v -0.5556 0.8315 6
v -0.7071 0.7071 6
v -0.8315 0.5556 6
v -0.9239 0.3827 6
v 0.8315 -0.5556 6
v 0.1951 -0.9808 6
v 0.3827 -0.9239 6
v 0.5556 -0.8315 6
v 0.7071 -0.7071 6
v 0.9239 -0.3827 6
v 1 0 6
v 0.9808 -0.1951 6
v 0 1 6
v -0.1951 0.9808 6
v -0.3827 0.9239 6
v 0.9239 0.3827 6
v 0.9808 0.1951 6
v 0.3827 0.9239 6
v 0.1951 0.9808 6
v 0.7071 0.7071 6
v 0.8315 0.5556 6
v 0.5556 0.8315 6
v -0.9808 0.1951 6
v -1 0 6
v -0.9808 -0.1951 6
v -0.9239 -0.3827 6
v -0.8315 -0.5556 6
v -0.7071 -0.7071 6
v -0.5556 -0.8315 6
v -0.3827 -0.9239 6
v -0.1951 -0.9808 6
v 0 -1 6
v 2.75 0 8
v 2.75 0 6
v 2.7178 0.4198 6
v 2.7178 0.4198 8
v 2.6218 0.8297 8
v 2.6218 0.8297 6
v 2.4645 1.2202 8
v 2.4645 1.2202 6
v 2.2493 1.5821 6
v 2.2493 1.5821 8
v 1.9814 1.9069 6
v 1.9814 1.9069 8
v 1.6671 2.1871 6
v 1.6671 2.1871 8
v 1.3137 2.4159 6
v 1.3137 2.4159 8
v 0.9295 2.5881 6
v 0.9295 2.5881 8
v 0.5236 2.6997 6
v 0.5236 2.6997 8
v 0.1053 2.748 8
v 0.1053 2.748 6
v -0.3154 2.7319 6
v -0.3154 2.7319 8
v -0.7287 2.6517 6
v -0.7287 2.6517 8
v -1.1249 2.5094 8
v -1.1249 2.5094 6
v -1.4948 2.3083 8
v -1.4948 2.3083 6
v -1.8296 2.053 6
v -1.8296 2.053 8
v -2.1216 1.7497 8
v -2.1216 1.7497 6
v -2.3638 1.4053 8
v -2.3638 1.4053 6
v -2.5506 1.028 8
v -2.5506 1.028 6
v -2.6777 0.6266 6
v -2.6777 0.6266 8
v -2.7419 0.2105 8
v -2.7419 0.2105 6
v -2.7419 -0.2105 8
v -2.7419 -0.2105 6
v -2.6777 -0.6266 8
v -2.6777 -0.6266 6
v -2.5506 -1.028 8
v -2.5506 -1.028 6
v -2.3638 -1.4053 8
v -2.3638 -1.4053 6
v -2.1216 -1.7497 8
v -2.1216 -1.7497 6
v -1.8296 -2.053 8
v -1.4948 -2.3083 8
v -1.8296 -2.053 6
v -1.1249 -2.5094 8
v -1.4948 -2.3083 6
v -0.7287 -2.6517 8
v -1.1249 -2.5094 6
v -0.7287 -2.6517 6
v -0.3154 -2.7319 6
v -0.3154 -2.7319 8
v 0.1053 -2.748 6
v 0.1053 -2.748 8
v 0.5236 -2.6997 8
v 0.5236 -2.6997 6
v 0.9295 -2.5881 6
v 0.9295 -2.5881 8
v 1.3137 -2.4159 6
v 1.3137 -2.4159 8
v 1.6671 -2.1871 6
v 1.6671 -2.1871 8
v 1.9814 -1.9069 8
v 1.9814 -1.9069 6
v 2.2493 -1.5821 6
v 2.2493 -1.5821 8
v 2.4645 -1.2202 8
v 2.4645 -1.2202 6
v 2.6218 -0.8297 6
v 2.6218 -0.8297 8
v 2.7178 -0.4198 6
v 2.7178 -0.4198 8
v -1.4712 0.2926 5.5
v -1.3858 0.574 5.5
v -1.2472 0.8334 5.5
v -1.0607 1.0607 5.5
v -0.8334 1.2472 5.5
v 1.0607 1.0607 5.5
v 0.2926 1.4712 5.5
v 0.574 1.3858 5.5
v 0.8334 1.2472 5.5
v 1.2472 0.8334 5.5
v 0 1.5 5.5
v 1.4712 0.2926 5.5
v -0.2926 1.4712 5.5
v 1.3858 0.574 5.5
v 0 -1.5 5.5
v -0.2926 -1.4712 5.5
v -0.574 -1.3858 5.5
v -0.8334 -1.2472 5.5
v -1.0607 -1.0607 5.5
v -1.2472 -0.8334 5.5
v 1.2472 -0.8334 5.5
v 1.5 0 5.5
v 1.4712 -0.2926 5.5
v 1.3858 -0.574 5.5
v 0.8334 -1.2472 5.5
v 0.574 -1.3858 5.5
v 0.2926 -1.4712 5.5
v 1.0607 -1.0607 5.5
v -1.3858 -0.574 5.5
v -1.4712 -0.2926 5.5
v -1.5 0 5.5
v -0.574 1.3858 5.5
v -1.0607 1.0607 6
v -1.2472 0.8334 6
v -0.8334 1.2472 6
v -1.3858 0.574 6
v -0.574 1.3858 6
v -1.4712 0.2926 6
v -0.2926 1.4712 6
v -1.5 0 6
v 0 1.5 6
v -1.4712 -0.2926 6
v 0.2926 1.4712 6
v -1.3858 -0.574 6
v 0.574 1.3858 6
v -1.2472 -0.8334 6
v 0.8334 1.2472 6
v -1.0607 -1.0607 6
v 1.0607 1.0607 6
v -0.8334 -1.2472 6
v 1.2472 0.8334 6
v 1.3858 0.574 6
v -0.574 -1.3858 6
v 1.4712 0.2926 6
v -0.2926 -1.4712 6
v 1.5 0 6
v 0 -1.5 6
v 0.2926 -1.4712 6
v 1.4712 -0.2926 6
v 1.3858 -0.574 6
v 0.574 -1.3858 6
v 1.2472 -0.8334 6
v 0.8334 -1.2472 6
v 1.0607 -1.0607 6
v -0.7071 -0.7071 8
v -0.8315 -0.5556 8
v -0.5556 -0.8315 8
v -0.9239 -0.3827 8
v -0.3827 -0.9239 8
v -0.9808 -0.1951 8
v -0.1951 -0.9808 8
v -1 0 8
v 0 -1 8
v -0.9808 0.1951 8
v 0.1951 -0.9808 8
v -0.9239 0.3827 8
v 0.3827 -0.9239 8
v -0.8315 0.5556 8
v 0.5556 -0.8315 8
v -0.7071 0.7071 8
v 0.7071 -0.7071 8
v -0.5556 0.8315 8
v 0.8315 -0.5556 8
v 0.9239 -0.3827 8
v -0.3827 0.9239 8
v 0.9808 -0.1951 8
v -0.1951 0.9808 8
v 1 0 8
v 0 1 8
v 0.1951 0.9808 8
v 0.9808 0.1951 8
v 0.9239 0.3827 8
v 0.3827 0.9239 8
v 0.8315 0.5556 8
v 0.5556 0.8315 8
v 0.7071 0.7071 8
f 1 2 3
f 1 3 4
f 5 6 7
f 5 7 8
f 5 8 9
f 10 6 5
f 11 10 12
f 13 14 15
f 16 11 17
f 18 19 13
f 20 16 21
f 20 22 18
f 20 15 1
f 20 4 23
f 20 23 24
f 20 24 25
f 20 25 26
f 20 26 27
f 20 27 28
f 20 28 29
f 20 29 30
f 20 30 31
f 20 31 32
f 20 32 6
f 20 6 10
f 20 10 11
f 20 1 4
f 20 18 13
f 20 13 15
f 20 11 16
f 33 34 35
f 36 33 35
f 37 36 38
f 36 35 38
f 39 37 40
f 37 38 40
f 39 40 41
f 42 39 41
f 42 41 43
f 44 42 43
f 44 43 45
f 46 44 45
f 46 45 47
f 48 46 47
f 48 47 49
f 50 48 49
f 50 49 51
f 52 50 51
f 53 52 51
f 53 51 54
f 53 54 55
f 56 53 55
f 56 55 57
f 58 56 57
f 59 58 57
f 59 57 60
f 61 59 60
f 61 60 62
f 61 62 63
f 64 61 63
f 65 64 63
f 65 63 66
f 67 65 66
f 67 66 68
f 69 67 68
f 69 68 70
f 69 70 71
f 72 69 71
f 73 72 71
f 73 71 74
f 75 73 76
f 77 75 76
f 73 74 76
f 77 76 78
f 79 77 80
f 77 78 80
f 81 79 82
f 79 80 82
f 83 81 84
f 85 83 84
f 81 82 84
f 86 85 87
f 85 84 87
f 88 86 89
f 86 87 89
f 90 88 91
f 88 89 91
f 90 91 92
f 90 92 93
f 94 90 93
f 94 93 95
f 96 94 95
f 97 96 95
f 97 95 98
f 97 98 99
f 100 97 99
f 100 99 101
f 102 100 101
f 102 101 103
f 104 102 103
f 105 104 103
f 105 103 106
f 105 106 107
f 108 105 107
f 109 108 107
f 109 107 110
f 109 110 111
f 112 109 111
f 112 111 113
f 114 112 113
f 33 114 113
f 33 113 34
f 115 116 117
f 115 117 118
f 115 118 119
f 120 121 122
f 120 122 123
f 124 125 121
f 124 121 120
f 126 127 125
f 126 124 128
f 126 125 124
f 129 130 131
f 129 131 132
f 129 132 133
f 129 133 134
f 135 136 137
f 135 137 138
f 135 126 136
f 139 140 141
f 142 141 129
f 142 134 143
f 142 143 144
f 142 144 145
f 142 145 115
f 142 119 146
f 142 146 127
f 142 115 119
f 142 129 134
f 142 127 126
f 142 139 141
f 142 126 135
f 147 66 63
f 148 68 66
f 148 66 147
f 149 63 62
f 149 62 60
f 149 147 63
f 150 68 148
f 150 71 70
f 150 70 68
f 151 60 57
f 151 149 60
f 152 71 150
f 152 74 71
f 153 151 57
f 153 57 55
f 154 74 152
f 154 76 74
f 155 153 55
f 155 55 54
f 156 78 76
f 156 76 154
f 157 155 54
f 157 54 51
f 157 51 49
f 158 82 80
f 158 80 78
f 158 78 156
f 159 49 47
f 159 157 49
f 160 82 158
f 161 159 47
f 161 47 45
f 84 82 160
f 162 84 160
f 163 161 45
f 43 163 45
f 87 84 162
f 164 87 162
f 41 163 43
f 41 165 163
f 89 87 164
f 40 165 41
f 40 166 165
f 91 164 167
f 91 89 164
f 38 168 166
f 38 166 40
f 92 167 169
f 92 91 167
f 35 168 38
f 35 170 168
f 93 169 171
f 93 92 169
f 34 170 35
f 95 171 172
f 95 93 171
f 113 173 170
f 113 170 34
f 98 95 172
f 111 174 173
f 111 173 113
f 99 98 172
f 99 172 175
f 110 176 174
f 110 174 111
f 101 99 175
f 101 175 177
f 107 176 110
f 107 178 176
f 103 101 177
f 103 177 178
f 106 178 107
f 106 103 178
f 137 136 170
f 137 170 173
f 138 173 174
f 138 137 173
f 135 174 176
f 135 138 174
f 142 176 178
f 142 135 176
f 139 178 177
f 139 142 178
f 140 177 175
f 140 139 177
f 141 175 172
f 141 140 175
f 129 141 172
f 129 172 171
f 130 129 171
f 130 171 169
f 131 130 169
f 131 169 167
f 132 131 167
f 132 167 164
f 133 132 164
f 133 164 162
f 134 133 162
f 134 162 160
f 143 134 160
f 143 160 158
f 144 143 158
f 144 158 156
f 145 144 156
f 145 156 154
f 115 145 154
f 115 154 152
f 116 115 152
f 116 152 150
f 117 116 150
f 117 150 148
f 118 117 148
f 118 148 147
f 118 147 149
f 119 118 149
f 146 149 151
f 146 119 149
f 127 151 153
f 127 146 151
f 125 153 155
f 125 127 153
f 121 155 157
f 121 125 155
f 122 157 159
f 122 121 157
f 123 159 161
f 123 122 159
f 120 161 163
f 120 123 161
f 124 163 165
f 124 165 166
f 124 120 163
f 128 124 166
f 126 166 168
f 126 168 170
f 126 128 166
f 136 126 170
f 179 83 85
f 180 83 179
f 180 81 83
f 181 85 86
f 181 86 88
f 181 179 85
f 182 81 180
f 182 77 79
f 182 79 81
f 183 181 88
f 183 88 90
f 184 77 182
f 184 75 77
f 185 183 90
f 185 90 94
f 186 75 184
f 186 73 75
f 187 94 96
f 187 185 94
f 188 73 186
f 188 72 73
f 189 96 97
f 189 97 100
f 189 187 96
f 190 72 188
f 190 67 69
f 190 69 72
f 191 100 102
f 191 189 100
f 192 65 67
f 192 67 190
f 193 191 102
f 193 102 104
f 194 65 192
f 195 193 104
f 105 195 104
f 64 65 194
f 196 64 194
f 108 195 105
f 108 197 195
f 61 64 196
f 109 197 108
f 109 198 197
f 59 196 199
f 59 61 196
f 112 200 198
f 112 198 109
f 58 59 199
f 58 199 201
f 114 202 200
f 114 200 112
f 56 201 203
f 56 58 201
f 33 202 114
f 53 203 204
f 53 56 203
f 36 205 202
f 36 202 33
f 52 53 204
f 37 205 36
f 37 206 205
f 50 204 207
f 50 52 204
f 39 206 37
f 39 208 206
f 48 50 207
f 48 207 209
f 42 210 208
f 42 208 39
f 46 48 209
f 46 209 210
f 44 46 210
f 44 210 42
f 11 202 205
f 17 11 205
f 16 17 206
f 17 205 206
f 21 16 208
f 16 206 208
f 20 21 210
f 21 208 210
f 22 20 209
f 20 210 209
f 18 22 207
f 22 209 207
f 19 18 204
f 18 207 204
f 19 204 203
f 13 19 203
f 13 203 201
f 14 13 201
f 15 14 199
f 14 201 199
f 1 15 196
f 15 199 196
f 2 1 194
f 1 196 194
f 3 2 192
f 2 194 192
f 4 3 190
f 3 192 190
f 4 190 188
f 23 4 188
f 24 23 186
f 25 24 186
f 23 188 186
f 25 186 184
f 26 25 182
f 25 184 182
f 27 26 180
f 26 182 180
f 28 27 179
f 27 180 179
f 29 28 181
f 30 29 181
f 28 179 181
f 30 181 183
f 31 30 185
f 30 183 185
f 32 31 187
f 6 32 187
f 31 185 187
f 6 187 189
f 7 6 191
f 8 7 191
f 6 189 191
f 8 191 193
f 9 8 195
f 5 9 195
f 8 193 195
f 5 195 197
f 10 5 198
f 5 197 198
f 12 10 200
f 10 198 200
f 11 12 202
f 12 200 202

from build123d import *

# Parameters (mm, degrees)
F0_R     = 2.75
F1_DEPTH = 8
F2_R     = 2.75
F2_R_2   = 1.5
F3_DEPTH = 6
F4_R     = 1
F5_DEPTH = 2
F6_R     = 1.5
F7_DEPTH = 5.5


with BuildPart() as f1:
    # F0 (on Top) → F1 (new body)
    with BuildSketch(Plane.XY):
        Circle(F0_R)
    extrude(amount=F1_DEPTH)

    # F2 (on face) → F3 (cut)
    with BuildSketch(Plane(origin=(0, 0, 0), x_dir=(1, 0, 0), z_dir=(0, 0, -1))):
        Circle(F2_R)
        Circle(F2_R_2, mode=Mode.SUBTRACT)
    extrude(amount=-F3_DEPTH, mode=Mode.SUBTRACT)

    # F4 (on face) → F5 (cut)
    with BuildSketch(Plane.XY.offset(8)):
        Circle(F4_R)
    extrude(amount=-F5_DEPTH, mode=Mode.SUBTRACT)

    # F6 (on face) → F7 (cut)
    with BuildSketch(Plane(origin=(0, 0, 0), x_dir=(1, 0, 0), z_dir=(0, 0, -1))):
        Circle(F6_R)
    extrude(amount=-F7_DEPTH, mode=Mode.SUBTRACT)


solid = f1.part
